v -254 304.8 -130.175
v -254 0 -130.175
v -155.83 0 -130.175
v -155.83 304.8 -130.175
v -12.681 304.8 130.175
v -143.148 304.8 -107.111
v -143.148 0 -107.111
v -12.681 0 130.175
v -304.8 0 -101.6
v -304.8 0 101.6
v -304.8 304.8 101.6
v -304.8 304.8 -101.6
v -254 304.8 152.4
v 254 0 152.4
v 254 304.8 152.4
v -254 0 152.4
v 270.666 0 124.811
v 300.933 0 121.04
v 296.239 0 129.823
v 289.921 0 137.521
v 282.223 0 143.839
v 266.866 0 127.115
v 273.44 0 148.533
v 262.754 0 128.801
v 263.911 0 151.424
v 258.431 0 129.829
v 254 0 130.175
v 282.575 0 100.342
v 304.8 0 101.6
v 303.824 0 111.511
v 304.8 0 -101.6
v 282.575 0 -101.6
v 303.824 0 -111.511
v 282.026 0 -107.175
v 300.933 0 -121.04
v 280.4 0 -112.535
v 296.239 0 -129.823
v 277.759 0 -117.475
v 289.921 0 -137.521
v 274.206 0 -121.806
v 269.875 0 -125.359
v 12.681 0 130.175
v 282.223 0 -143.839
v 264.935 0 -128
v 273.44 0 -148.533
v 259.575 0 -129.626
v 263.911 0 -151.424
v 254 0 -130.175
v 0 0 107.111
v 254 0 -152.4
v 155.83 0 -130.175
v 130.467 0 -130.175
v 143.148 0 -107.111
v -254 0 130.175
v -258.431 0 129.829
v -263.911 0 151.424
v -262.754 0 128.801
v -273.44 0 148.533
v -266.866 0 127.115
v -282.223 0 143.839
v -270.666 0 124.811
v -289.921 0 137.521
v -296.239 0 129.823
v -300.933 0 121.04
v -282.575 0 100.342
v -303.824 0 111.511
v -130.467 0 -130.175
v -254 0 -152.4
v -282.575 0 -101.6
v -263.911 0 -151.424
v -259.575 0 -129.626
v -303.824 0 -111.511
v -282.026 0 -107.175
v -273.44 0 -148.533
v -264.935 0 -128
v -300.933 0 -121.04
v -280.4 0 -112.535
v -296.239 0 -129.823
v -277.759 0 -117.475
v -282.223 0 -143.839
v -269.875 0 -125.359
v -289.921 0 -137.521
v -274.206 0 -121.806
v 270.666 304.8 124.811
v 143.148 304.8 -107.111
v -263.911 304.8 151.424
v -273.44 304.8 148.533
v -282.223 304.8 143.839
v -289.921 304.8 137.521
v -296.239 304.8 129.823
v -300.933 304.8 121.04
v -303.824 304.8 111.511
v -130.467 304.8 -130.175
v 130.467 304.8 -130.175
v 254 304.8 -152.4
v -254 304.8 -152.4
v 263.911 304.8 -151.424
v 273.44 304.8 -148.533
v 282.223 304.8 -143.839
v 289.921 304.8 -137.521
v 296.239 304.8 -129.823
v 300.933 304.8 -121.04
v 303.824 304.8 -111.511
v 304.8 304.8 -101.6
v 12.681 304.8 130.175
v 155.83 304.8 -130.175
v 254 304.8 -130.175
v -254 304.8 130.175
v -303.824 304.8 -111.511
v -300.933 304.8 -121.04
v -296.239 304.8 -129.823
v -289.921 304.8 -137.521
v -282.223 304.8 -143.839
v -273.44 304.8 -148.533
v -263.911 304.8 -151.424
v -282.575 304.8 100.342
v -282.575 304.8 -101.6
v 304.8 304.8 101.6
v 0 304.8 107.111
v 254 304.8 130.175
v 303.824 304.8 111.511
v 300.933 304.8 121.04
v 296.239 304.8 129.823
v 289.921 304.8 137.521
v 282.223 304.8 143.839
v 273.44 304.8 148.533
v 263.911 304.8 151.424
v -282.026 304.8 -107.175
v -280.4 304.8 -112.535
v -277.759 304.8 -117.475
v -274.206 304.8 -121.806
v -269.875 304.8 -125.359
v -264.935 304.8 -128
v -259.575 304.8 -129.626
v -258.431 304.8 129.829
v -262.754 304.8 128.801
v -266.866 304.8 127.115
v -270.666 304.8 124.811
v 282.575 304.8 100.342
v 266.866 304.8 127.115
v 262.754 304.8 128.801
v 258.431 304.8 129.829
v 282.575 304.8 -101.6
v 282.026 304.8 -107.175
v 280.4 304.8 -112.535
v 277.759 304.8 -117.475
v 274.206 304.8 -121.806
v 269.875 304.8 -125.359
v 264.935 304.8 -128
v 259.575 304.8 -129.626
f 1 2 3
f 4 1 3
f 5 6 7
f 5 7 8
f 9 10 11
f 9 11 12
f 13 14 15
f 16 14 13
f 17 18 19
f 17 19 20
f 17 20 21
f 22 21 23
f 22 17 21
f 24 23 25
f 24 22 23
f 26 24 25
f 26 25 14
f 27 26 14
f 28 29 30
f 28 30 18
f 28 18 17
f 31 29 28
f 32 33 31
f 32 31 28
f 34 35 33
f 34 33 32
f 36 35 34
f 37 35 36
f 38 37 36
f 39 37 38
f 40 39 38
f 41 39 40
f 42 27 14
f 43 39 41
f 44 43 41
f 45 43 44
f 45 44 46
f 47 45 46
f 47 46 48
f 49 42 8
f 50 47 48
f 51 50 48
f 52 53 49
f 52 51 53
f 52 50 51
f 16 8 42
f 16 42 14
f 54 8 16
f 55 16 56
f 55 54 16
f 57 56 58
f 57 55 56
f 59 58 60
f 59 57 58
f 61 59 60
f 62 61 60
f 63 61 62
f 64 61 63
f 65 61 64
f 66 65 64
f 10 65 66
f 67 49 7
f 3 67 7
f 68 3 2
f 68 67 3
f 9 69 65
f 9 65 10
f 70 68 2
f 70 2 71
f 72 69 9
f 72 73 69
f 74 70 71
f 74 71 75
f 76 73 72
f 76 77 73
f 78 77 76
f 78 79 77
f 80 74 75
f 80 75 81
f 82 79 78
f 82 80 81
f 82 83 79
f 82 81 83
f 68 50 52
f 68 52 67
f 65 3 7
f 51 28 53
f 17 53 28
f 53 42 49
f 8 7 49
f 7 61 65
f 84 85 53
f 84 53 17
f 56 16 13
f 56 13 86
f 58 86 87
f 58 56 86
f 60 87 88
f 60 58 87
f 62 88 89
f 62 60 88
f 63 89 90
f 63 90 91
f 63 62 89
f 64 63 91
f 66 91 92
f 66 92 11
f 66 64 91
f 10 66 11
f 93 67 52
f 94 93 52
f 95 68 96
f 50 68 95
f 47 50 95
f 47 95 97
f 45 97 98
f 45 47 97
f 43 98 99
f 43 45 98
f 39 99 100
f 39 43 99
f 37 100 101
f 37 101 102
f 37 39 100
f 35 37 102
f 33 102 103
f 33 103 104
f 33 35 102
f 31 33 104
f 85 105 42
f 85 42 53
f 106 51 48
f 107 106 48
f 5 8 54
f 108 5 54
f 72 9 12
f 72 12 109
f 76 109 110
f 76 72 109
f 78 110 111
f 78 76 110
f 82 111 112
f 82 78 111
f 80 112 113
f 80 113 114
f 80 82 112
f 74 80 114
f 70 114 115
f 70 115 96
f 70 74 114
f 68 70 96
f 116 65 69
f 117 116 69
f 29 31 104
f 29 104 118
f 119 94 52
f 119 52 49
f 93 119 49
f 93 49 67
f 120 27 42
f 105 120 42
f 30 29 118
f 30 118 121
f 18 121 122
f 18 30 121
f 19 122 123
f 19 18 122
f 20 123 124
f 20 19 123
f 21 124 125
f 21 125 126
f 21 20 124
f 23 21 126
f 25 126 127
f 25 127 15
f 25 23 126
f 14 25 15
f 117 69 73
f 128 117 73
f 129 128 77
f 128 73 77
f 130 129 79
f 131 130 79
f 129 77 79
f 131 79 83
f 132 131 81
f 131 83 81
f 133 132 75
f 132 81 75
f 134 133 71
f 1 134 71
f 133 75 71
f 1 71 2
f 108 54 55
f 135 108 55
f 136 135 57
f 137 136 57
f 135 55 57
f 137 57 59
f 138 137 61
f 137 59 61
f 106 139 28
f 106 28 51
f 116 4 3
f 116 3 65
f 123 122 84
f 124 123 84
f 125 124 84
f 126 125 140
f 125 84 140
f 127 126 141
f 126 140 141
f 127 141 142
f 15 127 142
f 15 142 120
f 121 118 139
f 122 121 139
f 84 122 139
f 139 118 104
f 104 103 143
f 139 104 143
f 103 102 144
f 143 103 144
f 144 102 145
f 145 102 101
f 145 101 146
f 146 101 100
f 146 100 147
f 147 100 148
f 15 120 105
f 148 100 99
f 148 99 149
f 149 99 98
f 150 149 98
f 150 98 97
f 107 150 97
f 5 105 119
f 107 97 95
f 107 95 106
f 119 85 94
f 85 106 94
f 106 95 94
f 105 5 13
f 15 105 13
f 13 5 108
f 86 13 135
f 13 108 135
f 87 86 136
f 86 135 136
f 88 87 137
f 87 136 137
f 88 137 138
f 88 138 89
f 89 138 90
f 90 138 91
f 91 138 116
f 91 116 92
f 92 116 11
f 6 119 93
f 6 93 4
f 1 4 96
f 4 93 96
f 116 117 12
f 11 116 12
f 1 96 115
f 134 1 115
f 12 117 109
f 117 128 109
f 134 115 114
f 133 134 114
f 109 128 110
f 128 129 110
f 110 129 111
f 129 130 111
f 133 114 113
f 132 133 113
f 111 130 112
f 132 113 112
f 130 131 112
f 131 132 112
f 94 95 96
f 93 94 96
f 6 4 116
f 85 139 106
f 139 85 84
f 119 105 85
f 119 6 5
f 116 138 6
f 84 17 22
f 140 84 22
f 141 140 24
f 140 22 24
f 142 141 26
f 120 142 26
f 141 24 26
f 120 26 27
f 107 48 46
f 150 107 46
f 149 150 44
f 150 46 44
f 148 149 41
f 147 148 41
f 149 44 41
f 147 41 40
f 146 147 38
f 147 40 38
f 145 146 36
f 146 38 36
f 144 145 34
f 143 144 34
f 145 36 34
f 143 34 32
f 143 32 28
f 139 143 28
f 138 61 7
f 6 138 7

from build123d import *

# Parameters (mm, degrees)
EXTRUDE_THIN1_DEPTH = 304.8
EXTRUDE_THIN3_DEPTH = 304.8


with BuildPart() as part:
    # Sketch1 → Extrude-Thin1 (new body)
    with BuildSketch(Plane(origin=(0, 0, 0), x_dir=(1, 0, 0), z_dir=(0, 1, 0))):
        with BuildLine():
            Line((-254, 152.4), (254, 152.4))
            ThreePointArc((254, 152.4), (289.921024484, 137.521024484), (304.8, 101.6))
            Line((304.8, 101.6), (304.8, -101.6))
            ThreePointArc((304.8, -101.6), (289.921024484, -137.521024484), (254, -152.4))
            Line((254, -152.4), (-254, -152.4))
            ThreePointArc((-254, -152.4), (-289.921024484, -137.521024484), (-304.8, -101.6))
            Line((-304.8, -101.6), (-304.8, 101.6))
            ThreePointArc((-304.8, 101.6), (-289.921024484, 137.521024484), (-254, 152.4))
        make_face()
        with BuildLine():
            Line((-254, 130.175), (254, 130.175))
            ThreePointArc((254, 130.175), (274.205576272, 121.805576272), (282.575, 101.6))
            Line((282.575, 101.6), (282.575, -101.6))
            ThreePointArc((282.575, -101.6), (274.205576272, -121.805576272), (254, -130.175))
            Line((254, -130.175), (-254, -130.175))
            ThreePointArc((-254, -130.175), (-274.205576272, -121.805576272), (-282.575, -101.6))
            Line((-282.575, -101.6), (-282.575, 101.6))
            ThreePointArc((-282.575, 101.6), (-274.205576272, 121.805576272), (-254, 130.175))
        make_face(mode=Mode.SUBTRACT)
    extrude(amount=EXTRUDE_THIN1_DEPTH)

    # Sketch2 → Extrude-Thin3 (add)
    with BuildSketch(Plane(origin=(0, 304.8, 0), x_dir=(1, 0, 0), z_dir=(0, 1, 0))):
        with BuildLine():
            Line((-276.558924799, -135.529052432), (-143.148286149, 107.110665493))
            Line((-143.148286149, 107.110665493), (-11.963395498, -131.480987957))
            ThreePointArc((-11.963395498, -131.480987957), (0, -138.555652113), (11.963395498, -131.480987957))
            Line((11.963395498, -131.480987957), (143.148286149, 107.110665493))
            Line((143.148286149, 107.110665493), (276.558924799, -135.529052432))
            Line((276.558924799, -135.529052432), (296.034219796, -124.820947568))
            Line((296.034219796, -124.820947568), (155.111681647, 131.480987957))
            ThreePointArc((155.111681647, 131.480987957), (143.148286149, 138.555652113), (131.18489065, 131.480987957))
            Line((131.18489065, 131.480987957), (0, -107.110665493))
            Line((0, -107.110665493), (-131.18489065, 131.480987957))
            ThreePointArc((-131.18489065, 131.480987957), (-143.148286149, 138.555652113), (-155.111681647, 131.480987957))
            Line((-155.111681647, 131.480987957), (-296.034219796, -124.820947568))
            Line((-296.034219796, -124.820947568), (-276.558924799, -135.529052432))
        make_face()
    extrude(amount=-EXTRUDE_THIN3_DEPTH)


solid = part.part
